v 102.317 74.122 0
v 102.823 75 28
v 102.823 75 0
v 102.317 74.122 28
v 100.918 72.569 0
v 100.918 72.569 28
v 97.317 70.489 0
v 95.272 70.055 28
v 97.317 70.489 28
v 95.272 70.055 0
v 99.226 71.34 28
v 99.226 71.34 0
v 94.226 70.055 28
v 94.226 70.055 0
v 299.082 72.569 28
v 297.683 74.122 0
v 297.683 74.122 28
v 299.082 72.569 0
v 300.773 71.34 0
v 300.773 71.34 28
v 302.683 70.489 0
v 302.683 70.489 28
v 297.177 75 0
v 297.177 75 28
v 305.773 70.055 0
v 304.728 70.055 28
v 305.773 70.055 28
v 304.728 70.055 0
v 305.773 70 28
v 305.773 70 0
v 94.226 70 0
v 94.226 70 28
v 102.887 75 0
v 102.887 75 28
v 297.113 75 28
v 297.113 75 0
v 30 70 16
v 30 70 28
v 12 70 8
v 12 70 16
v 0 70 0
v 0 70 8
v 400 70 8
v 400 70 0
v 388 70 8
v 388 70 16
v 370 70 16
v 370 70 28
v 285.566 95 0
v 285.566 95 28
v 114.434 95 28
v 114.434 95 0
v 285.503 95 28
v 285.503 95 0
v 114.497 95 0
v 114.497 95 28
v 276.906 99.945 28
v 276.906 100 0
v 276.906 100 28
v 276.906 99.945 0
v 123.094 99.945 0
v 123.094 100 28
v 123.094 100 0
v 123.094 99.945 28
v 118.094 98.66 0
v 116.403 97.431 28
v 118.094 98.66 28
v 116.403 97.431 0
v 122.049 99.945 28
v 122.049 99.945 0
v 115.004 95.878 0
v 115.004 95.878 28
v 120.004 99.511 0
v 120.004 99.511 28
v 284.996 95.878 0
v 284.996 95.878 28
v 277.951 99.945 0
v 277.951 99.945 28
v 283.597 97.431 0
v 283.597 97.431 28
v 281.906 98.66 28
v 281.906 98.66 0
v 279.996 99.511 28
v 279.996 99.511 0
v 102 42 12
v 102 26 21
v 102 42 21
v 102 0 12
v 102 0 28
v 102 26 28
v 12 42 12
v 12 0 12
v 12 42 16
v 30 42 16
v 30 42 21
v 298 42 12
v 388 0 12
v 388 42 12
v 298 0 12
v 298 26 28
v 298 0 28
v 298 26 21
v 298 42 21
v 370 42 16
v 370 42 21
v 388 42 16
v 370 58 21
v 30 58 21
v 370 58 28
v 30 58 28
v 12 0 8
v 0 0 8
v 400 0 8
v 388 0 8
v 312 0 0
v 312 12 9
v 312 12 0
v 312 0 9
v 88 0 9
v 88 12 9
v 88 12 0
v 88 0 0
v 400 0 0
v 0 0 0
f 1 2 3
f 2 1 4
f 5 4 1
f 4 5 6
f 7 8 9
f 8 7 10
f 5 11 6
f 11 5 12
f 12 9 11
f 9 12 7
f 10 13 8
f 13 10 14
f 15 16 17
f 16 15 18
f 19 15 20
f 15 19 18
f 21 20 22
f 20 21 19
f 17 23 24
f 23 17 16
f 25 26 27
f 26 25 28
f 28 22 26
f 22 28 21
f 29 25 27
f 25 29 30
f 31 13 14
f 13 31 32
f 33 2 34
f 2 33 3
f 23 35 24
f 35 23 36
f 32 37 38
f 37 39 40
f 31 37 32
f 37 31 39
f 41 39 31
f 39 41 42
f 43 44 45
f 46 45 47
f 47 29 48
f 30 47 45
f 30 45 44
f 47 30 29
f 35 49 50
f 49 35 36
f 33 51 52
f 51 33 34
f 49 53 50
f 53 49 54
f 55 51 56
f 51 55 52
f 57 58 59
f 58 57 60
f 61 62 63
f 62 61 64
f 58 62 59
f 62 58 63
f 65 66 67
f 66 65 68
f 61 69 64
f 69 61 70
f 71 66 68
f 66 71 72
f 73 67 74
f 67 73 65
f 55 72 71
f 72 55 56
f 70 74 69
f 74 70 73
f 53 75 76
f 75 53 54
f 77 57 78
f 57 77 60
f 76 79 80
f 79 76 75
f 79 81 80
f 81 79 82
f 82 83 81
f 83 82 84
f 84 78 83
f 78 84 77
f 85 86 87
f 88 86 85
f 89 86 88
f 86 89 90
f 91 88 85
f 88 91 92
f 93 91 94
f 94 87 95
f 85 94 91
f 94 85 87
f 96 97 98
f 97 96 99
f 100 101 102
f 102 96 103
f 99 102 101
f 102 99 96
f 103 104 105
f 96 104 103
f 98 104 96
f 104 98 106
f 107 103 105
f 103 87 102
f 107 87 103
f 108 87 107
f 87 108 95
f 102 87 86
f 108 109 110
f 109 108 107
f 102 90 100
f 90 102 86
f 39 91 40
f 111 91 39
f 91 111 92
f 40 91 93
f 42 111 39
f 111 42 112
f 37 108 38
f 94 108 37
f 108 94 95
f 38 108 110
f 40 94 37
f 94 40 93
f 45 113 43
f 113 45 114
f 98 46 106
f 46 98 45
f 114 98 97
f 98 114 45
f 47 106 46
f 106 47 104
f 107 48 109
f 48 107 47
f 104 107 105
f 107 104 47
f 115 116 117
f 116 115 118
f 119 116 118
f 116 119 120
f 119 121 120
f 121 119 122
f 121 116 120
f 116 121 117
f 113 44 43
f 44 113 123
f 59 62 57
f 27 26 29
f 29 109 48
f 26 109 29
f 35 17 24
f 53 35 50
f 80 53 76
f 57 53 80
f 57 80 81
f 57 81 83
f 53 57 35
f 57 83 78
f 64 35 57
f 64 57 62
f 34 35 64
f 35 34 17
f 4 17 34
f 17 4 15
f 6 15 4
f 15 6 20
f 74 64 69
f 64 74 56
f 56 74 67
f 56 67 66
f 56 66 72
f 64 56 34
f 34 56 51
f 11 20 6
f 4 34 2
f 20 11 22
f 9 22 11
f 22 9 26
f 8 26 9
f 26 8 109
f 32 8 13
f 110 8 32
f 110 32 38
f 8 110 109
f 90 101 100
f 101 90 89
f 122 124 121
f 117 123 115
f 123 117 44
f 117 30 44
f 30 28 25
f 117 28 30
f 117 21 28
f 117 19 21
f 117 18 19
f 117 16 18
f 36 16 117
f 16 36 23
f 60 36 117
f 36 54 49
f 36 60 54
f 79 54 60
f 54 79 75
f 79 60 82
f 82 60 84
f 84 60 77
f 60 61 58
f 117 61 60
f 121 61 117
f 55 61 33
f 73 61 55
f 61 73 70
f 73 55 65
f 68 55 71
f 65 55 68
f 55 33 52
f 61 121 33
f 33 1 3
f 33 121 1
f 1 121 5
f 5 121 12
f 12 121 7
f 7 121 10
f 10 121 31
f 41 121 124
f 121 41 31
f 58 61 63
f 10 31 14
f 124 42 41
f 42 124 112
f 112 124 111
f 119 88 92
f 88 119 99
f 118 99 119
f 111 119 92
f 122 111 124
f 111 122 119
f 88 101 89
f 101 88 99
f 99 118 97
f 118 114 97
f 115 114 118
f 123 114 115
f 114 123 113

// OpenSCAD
include <../src/wardrobe.scad>;
plank_xz_rear_top(wardrobe_n);
//github_openscad -o wardrobe_1/plank_xz_rear_top.stl -D wardrobe_n=1 -D cutting_edge=0 -D break_view_length=0 wardrobe_1/plank_xz_rear_top_stl.scad
